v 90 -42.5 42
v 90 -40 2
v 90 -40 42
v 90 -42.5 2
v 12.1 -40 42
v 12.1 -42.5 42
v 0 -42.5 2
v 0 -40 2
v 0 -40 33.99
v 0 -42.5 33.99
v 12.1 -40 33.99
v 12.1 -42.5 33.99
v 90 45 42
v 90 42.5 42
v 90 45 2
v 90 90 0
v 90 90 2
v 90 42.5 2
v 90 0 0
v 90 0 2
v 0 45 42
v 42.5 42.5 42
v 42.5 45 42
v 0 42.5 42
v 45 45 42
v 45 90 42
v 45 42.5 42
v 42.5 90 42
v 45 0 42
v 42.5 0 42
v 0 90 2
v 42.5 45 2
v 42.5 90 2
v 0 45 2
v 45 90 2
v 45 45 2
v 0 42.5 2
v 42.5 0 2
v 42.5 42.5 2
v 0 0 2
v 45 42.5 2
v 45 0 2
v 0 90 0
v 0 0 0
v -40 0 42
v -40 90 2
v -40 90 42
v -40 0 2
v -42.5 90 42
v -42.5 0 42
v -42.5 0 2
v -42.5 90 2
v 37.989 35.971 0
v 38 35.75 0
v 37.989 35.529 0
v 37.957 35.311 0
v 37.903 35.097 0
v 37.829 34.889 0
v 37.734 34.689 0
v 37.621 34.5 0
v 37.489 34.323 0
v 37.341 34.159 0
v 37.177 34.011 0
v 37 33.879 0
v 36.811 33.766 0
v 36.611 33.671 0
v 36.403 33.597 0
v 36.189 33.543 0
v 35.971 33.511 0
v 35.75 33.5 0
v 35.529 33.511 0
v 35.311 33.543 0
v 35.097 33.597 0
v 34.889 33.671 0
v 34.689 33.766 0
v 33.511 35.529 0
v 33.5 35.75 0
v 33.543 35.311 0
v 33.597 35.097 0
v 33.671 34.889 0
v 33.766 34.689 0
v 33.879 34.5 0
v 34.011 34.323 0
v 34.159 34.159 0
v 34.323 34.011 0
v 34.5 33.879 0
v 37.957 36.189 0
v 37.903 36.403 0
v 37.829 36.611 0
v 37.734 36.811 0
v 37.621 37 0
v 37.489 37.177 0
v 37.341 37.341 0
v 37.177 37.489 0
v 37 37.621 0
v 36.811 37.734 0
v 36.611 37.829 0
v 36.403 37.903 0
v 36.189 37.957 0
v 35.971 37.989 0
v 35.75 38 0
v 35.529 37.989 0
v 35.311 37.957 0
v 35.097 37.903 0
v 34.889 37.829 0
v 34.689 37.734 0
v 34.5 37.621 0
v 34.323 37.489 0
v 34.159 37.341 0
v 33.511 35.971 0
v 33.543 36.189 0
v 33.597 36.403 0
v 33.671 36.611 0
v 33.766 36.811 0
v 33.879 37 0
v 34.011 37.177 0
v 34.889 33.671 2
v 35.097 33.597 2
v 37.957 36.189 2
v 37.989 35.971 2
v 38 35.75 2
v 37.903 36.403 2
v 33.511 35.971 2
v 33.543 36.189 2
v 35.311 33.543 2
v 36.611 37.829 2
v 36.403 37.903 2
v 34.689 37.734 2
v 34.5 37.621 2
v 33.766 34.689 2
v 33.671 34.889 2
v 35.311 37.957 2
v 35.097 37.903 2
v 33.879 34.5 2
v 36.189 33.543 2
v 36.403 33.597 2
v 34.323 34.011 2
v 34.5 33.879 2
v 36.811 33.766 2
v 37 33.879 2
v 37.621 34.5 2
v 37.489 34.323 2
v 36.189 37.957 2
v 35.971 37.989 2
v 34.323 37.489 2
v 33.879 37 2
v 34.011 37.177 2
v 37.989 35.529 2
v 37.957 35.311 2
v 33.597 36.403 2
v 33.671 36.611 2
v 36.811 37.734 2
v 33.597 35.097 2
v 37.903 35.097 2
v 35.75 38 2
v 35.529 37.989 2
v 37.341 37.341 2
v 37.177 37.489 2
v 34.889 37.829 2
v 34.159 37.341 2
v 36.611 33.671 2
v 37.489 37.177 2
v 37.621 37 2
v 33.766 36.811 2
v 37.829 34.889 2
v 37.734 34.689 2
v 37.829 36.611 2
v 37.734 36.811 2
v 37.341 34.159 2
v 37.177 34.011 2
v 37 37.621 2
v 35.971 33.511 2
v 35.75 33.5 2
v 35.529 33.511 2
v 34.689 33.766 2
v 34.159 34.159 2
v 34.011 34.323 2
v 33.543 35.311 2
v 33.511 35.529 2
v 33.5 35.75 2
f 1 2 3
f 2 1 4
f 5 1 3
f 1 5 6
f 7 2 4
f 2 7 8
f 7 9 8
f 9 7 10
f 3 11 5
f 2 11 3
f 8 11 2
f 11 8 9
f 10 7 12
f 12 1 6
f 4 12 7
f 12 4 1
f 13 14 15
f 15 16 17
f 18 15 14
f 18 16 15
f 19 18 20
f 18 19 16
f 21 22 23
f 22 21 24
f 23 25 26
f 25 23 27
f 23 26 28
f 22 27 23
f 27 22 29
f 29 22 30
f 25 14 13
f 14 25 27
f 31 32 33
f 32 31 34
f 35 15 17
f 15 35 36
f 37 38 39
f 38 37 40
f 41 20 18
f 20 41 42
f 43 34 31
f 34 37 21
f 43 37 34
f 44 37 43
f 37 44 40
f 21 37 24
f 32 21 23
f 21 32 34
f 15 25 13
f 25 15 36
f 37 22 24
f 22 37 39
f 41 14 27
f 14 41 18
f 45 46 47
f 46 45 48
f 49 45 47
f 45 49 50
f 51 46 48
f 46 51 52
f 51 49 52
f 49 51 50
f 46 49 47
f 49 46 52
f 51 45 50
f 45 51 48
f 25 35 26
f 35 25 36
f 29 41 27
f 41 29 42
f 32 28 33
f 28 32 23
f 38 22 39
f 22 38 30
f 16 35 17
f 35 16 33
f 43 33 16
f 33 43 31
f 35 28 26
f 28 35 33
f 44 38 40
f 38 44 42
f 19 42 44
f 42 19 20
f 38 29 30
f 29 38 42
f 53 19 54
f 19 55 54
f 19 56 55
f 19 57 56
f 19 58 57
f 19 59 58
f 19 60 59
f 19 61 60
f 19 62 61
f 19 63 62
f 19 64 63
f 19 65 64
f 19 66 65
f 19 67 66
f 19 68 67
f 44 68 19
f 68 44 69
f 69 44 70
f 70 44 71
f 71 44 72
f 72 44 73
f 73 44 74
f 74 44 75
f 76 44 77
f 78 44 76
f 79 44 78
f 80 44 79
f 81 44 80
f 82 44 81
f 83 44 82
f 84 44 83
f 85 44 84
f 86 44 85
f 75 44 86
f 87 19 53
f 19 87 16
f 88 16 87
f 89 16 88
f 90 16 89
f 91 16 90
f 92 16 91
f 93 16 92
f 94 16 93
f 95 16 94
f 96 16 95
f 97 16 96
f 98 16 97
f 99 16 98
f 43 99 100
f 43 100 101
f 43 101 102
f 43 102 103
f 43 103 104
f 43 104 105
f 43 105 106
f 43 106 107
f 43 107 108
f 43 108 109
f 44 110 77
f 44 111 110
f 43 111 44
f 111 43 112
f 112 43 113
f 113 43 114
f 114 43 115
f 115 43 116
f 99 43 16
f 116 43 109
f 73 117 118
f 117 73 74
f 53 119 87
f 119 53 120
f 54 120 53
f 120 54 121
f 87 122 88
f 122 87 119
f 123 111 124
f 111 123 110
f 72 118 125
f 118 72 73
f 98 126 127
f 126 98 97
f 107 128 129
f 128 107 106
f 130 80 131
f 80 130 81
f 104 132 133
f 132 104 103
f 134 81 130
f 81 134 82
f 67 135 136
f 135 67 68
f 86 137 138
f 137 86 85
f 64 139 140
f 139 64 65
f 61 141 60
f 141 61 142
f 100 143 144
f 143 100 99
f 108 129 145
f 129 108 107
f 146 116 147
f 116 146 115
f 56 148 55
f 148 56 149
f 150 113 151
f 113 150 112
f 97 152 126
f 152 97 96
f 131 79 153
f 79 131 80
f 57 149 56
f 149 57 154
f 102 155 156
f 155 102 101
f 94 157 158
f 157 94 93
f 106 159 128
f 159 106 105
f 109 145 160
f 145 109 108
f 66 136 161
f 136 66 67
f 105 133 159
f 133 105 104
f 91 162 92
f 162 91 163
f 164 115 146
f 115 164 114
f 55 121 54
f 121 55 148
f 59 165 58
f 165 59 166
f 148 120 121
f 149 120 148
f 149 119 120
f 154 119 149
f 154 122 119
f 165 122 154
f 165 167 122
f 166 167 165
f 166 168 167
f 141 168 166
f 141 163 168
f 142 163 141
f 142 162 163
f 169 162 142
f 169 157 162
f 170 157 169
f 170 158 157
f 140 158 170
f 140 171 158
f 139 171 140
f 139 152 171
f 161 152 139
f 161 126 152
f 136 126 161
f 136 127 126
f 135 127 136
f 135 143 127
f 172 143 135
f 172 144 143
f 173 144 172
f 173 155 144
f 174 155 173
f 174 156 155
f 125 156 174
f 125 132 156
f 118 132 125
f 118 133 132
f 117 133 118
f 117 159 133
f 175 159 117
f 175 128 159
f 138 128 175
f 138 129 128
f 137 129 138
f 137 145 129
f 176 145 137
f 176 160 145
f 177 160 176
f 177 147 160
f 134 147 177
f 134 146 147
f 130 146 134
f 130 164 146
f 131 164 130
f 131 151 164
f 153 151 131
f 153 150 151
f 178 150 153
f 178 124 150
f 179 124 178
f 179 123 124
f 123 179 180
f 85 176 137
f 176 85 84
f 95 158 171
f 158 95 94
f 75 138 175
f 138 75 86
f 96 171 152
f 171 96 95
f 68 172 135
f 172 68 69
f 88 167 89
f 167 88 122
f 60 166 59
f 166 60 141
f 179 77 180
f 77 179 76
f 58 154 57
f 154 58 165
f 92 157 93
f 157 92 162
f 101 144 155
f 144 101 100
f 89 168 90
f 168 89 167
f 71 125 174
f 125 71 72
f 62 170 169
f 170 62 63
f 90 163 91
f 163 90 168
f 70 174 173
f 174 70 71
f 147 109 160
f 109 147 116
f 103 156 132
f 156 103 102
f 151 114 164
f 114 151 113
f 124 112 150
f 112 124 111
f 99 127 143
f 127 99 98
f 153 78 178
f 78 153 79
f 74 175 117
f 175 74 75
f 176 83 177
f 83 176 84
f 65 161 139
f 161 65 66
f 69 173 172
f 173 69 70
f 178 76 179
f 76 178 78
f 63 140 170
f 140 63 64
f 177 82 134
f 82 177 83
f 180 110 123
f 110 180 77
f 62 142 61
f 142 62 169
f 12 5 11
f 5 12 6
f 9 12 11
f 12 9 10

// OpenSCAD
// Dimensions
outer_size = 90;          // outer X/Y size in mm
wall_thickness = 2.5;     // wall thickness in mm
top_thickness = 2;        // top plate thickness in mm
height = 40;              // total height from top plate to open top
hole_pattern_size = 71.5; // screw hole pattern square size in mm
hole_diameter = 4.5;      // screw hole diameter in mm
notch_width = 12;         // notch width in mm
notch_depth = 8;          // notch depth from top (40 - 32) in mm

// Derived dimensions
inner_size = outer_size - 2 * wall_thickness;

// Screw hole positions (4 holes on square pattern)
hole_offset = hole_pattern_size / 2;

// Notch position: centered on one wall (Y negative side)
notch_x_center = 0;
notch_y_start = -inner_size/2;
notch_y_end = notch_y_start + notch_width;
notch_z_start = height - notch_depth;

// Top plate - positioned at z = 0 to 2
module top_plate() {
    cube([outer_size, outer_size, top_thickness]);
}

// Walls - positioned on top of top plate (z = 2 to 42)
module walls() {
    // Front wall (Y negative side)
    translate([0, -inner_size/2, top_thickness])
        cube([outer_size, wall_thickness, height]);
    
    // Back wall (Y positive side)
    translate([0, inner_size/2, top_thickness])
        cube([outer_size, wall_thickness, height]);
    
    // Left wall (X negative side)
    translate([-inner_size/2, 0, top_thickness])
        cube([wall_thickness, outer_size, height]);
    
    // Right wall (X positive side)
    translate([inner_size/2, 0, top_thickness])
        cube([wall_thickness, outer_size, height]);
}

// Screw holes - through the top plate
module screw_holes() {
    for (x = [-1, 1]) {
        for (y = [-1, 1]) {
            translate([x * hole_offset, y * hole_offset, -0.01])
                cylinder(h = top_thickness + 0.02, r = hole_diameter/2, $fn = 64);
        }
    }
}

// Notch for power cable - in front wall (Y negative side)
module notch() {
    // Notch in front wall (Y negative side)
    // The notch is 12mm wide, centered on the wall, and goes 8mm down from the top (z = 42 - 8 = 34 to 42)
    translate([0, -inner_size/2, height + top_thickness - notch_depth])
        cube([notch_width + 0.1, wall_thickness + 0.1, notch_depth + 0.02]);
}

// Assemble the housing
module housing() {
    union() {
        top_plate();
        walls();
    }
}

// Subtract screw holes
module housing_with_holes() {
    difference() {
        housing();
        translate([0, 0, -0.01])
            screw_holes();
    }
}

// Subtract notch
module final_housing() {
    difference() {
        housing_with_holes();
        translate([0, 0, -0.01])
            notch();
    }
}

// Render
final_housing();
